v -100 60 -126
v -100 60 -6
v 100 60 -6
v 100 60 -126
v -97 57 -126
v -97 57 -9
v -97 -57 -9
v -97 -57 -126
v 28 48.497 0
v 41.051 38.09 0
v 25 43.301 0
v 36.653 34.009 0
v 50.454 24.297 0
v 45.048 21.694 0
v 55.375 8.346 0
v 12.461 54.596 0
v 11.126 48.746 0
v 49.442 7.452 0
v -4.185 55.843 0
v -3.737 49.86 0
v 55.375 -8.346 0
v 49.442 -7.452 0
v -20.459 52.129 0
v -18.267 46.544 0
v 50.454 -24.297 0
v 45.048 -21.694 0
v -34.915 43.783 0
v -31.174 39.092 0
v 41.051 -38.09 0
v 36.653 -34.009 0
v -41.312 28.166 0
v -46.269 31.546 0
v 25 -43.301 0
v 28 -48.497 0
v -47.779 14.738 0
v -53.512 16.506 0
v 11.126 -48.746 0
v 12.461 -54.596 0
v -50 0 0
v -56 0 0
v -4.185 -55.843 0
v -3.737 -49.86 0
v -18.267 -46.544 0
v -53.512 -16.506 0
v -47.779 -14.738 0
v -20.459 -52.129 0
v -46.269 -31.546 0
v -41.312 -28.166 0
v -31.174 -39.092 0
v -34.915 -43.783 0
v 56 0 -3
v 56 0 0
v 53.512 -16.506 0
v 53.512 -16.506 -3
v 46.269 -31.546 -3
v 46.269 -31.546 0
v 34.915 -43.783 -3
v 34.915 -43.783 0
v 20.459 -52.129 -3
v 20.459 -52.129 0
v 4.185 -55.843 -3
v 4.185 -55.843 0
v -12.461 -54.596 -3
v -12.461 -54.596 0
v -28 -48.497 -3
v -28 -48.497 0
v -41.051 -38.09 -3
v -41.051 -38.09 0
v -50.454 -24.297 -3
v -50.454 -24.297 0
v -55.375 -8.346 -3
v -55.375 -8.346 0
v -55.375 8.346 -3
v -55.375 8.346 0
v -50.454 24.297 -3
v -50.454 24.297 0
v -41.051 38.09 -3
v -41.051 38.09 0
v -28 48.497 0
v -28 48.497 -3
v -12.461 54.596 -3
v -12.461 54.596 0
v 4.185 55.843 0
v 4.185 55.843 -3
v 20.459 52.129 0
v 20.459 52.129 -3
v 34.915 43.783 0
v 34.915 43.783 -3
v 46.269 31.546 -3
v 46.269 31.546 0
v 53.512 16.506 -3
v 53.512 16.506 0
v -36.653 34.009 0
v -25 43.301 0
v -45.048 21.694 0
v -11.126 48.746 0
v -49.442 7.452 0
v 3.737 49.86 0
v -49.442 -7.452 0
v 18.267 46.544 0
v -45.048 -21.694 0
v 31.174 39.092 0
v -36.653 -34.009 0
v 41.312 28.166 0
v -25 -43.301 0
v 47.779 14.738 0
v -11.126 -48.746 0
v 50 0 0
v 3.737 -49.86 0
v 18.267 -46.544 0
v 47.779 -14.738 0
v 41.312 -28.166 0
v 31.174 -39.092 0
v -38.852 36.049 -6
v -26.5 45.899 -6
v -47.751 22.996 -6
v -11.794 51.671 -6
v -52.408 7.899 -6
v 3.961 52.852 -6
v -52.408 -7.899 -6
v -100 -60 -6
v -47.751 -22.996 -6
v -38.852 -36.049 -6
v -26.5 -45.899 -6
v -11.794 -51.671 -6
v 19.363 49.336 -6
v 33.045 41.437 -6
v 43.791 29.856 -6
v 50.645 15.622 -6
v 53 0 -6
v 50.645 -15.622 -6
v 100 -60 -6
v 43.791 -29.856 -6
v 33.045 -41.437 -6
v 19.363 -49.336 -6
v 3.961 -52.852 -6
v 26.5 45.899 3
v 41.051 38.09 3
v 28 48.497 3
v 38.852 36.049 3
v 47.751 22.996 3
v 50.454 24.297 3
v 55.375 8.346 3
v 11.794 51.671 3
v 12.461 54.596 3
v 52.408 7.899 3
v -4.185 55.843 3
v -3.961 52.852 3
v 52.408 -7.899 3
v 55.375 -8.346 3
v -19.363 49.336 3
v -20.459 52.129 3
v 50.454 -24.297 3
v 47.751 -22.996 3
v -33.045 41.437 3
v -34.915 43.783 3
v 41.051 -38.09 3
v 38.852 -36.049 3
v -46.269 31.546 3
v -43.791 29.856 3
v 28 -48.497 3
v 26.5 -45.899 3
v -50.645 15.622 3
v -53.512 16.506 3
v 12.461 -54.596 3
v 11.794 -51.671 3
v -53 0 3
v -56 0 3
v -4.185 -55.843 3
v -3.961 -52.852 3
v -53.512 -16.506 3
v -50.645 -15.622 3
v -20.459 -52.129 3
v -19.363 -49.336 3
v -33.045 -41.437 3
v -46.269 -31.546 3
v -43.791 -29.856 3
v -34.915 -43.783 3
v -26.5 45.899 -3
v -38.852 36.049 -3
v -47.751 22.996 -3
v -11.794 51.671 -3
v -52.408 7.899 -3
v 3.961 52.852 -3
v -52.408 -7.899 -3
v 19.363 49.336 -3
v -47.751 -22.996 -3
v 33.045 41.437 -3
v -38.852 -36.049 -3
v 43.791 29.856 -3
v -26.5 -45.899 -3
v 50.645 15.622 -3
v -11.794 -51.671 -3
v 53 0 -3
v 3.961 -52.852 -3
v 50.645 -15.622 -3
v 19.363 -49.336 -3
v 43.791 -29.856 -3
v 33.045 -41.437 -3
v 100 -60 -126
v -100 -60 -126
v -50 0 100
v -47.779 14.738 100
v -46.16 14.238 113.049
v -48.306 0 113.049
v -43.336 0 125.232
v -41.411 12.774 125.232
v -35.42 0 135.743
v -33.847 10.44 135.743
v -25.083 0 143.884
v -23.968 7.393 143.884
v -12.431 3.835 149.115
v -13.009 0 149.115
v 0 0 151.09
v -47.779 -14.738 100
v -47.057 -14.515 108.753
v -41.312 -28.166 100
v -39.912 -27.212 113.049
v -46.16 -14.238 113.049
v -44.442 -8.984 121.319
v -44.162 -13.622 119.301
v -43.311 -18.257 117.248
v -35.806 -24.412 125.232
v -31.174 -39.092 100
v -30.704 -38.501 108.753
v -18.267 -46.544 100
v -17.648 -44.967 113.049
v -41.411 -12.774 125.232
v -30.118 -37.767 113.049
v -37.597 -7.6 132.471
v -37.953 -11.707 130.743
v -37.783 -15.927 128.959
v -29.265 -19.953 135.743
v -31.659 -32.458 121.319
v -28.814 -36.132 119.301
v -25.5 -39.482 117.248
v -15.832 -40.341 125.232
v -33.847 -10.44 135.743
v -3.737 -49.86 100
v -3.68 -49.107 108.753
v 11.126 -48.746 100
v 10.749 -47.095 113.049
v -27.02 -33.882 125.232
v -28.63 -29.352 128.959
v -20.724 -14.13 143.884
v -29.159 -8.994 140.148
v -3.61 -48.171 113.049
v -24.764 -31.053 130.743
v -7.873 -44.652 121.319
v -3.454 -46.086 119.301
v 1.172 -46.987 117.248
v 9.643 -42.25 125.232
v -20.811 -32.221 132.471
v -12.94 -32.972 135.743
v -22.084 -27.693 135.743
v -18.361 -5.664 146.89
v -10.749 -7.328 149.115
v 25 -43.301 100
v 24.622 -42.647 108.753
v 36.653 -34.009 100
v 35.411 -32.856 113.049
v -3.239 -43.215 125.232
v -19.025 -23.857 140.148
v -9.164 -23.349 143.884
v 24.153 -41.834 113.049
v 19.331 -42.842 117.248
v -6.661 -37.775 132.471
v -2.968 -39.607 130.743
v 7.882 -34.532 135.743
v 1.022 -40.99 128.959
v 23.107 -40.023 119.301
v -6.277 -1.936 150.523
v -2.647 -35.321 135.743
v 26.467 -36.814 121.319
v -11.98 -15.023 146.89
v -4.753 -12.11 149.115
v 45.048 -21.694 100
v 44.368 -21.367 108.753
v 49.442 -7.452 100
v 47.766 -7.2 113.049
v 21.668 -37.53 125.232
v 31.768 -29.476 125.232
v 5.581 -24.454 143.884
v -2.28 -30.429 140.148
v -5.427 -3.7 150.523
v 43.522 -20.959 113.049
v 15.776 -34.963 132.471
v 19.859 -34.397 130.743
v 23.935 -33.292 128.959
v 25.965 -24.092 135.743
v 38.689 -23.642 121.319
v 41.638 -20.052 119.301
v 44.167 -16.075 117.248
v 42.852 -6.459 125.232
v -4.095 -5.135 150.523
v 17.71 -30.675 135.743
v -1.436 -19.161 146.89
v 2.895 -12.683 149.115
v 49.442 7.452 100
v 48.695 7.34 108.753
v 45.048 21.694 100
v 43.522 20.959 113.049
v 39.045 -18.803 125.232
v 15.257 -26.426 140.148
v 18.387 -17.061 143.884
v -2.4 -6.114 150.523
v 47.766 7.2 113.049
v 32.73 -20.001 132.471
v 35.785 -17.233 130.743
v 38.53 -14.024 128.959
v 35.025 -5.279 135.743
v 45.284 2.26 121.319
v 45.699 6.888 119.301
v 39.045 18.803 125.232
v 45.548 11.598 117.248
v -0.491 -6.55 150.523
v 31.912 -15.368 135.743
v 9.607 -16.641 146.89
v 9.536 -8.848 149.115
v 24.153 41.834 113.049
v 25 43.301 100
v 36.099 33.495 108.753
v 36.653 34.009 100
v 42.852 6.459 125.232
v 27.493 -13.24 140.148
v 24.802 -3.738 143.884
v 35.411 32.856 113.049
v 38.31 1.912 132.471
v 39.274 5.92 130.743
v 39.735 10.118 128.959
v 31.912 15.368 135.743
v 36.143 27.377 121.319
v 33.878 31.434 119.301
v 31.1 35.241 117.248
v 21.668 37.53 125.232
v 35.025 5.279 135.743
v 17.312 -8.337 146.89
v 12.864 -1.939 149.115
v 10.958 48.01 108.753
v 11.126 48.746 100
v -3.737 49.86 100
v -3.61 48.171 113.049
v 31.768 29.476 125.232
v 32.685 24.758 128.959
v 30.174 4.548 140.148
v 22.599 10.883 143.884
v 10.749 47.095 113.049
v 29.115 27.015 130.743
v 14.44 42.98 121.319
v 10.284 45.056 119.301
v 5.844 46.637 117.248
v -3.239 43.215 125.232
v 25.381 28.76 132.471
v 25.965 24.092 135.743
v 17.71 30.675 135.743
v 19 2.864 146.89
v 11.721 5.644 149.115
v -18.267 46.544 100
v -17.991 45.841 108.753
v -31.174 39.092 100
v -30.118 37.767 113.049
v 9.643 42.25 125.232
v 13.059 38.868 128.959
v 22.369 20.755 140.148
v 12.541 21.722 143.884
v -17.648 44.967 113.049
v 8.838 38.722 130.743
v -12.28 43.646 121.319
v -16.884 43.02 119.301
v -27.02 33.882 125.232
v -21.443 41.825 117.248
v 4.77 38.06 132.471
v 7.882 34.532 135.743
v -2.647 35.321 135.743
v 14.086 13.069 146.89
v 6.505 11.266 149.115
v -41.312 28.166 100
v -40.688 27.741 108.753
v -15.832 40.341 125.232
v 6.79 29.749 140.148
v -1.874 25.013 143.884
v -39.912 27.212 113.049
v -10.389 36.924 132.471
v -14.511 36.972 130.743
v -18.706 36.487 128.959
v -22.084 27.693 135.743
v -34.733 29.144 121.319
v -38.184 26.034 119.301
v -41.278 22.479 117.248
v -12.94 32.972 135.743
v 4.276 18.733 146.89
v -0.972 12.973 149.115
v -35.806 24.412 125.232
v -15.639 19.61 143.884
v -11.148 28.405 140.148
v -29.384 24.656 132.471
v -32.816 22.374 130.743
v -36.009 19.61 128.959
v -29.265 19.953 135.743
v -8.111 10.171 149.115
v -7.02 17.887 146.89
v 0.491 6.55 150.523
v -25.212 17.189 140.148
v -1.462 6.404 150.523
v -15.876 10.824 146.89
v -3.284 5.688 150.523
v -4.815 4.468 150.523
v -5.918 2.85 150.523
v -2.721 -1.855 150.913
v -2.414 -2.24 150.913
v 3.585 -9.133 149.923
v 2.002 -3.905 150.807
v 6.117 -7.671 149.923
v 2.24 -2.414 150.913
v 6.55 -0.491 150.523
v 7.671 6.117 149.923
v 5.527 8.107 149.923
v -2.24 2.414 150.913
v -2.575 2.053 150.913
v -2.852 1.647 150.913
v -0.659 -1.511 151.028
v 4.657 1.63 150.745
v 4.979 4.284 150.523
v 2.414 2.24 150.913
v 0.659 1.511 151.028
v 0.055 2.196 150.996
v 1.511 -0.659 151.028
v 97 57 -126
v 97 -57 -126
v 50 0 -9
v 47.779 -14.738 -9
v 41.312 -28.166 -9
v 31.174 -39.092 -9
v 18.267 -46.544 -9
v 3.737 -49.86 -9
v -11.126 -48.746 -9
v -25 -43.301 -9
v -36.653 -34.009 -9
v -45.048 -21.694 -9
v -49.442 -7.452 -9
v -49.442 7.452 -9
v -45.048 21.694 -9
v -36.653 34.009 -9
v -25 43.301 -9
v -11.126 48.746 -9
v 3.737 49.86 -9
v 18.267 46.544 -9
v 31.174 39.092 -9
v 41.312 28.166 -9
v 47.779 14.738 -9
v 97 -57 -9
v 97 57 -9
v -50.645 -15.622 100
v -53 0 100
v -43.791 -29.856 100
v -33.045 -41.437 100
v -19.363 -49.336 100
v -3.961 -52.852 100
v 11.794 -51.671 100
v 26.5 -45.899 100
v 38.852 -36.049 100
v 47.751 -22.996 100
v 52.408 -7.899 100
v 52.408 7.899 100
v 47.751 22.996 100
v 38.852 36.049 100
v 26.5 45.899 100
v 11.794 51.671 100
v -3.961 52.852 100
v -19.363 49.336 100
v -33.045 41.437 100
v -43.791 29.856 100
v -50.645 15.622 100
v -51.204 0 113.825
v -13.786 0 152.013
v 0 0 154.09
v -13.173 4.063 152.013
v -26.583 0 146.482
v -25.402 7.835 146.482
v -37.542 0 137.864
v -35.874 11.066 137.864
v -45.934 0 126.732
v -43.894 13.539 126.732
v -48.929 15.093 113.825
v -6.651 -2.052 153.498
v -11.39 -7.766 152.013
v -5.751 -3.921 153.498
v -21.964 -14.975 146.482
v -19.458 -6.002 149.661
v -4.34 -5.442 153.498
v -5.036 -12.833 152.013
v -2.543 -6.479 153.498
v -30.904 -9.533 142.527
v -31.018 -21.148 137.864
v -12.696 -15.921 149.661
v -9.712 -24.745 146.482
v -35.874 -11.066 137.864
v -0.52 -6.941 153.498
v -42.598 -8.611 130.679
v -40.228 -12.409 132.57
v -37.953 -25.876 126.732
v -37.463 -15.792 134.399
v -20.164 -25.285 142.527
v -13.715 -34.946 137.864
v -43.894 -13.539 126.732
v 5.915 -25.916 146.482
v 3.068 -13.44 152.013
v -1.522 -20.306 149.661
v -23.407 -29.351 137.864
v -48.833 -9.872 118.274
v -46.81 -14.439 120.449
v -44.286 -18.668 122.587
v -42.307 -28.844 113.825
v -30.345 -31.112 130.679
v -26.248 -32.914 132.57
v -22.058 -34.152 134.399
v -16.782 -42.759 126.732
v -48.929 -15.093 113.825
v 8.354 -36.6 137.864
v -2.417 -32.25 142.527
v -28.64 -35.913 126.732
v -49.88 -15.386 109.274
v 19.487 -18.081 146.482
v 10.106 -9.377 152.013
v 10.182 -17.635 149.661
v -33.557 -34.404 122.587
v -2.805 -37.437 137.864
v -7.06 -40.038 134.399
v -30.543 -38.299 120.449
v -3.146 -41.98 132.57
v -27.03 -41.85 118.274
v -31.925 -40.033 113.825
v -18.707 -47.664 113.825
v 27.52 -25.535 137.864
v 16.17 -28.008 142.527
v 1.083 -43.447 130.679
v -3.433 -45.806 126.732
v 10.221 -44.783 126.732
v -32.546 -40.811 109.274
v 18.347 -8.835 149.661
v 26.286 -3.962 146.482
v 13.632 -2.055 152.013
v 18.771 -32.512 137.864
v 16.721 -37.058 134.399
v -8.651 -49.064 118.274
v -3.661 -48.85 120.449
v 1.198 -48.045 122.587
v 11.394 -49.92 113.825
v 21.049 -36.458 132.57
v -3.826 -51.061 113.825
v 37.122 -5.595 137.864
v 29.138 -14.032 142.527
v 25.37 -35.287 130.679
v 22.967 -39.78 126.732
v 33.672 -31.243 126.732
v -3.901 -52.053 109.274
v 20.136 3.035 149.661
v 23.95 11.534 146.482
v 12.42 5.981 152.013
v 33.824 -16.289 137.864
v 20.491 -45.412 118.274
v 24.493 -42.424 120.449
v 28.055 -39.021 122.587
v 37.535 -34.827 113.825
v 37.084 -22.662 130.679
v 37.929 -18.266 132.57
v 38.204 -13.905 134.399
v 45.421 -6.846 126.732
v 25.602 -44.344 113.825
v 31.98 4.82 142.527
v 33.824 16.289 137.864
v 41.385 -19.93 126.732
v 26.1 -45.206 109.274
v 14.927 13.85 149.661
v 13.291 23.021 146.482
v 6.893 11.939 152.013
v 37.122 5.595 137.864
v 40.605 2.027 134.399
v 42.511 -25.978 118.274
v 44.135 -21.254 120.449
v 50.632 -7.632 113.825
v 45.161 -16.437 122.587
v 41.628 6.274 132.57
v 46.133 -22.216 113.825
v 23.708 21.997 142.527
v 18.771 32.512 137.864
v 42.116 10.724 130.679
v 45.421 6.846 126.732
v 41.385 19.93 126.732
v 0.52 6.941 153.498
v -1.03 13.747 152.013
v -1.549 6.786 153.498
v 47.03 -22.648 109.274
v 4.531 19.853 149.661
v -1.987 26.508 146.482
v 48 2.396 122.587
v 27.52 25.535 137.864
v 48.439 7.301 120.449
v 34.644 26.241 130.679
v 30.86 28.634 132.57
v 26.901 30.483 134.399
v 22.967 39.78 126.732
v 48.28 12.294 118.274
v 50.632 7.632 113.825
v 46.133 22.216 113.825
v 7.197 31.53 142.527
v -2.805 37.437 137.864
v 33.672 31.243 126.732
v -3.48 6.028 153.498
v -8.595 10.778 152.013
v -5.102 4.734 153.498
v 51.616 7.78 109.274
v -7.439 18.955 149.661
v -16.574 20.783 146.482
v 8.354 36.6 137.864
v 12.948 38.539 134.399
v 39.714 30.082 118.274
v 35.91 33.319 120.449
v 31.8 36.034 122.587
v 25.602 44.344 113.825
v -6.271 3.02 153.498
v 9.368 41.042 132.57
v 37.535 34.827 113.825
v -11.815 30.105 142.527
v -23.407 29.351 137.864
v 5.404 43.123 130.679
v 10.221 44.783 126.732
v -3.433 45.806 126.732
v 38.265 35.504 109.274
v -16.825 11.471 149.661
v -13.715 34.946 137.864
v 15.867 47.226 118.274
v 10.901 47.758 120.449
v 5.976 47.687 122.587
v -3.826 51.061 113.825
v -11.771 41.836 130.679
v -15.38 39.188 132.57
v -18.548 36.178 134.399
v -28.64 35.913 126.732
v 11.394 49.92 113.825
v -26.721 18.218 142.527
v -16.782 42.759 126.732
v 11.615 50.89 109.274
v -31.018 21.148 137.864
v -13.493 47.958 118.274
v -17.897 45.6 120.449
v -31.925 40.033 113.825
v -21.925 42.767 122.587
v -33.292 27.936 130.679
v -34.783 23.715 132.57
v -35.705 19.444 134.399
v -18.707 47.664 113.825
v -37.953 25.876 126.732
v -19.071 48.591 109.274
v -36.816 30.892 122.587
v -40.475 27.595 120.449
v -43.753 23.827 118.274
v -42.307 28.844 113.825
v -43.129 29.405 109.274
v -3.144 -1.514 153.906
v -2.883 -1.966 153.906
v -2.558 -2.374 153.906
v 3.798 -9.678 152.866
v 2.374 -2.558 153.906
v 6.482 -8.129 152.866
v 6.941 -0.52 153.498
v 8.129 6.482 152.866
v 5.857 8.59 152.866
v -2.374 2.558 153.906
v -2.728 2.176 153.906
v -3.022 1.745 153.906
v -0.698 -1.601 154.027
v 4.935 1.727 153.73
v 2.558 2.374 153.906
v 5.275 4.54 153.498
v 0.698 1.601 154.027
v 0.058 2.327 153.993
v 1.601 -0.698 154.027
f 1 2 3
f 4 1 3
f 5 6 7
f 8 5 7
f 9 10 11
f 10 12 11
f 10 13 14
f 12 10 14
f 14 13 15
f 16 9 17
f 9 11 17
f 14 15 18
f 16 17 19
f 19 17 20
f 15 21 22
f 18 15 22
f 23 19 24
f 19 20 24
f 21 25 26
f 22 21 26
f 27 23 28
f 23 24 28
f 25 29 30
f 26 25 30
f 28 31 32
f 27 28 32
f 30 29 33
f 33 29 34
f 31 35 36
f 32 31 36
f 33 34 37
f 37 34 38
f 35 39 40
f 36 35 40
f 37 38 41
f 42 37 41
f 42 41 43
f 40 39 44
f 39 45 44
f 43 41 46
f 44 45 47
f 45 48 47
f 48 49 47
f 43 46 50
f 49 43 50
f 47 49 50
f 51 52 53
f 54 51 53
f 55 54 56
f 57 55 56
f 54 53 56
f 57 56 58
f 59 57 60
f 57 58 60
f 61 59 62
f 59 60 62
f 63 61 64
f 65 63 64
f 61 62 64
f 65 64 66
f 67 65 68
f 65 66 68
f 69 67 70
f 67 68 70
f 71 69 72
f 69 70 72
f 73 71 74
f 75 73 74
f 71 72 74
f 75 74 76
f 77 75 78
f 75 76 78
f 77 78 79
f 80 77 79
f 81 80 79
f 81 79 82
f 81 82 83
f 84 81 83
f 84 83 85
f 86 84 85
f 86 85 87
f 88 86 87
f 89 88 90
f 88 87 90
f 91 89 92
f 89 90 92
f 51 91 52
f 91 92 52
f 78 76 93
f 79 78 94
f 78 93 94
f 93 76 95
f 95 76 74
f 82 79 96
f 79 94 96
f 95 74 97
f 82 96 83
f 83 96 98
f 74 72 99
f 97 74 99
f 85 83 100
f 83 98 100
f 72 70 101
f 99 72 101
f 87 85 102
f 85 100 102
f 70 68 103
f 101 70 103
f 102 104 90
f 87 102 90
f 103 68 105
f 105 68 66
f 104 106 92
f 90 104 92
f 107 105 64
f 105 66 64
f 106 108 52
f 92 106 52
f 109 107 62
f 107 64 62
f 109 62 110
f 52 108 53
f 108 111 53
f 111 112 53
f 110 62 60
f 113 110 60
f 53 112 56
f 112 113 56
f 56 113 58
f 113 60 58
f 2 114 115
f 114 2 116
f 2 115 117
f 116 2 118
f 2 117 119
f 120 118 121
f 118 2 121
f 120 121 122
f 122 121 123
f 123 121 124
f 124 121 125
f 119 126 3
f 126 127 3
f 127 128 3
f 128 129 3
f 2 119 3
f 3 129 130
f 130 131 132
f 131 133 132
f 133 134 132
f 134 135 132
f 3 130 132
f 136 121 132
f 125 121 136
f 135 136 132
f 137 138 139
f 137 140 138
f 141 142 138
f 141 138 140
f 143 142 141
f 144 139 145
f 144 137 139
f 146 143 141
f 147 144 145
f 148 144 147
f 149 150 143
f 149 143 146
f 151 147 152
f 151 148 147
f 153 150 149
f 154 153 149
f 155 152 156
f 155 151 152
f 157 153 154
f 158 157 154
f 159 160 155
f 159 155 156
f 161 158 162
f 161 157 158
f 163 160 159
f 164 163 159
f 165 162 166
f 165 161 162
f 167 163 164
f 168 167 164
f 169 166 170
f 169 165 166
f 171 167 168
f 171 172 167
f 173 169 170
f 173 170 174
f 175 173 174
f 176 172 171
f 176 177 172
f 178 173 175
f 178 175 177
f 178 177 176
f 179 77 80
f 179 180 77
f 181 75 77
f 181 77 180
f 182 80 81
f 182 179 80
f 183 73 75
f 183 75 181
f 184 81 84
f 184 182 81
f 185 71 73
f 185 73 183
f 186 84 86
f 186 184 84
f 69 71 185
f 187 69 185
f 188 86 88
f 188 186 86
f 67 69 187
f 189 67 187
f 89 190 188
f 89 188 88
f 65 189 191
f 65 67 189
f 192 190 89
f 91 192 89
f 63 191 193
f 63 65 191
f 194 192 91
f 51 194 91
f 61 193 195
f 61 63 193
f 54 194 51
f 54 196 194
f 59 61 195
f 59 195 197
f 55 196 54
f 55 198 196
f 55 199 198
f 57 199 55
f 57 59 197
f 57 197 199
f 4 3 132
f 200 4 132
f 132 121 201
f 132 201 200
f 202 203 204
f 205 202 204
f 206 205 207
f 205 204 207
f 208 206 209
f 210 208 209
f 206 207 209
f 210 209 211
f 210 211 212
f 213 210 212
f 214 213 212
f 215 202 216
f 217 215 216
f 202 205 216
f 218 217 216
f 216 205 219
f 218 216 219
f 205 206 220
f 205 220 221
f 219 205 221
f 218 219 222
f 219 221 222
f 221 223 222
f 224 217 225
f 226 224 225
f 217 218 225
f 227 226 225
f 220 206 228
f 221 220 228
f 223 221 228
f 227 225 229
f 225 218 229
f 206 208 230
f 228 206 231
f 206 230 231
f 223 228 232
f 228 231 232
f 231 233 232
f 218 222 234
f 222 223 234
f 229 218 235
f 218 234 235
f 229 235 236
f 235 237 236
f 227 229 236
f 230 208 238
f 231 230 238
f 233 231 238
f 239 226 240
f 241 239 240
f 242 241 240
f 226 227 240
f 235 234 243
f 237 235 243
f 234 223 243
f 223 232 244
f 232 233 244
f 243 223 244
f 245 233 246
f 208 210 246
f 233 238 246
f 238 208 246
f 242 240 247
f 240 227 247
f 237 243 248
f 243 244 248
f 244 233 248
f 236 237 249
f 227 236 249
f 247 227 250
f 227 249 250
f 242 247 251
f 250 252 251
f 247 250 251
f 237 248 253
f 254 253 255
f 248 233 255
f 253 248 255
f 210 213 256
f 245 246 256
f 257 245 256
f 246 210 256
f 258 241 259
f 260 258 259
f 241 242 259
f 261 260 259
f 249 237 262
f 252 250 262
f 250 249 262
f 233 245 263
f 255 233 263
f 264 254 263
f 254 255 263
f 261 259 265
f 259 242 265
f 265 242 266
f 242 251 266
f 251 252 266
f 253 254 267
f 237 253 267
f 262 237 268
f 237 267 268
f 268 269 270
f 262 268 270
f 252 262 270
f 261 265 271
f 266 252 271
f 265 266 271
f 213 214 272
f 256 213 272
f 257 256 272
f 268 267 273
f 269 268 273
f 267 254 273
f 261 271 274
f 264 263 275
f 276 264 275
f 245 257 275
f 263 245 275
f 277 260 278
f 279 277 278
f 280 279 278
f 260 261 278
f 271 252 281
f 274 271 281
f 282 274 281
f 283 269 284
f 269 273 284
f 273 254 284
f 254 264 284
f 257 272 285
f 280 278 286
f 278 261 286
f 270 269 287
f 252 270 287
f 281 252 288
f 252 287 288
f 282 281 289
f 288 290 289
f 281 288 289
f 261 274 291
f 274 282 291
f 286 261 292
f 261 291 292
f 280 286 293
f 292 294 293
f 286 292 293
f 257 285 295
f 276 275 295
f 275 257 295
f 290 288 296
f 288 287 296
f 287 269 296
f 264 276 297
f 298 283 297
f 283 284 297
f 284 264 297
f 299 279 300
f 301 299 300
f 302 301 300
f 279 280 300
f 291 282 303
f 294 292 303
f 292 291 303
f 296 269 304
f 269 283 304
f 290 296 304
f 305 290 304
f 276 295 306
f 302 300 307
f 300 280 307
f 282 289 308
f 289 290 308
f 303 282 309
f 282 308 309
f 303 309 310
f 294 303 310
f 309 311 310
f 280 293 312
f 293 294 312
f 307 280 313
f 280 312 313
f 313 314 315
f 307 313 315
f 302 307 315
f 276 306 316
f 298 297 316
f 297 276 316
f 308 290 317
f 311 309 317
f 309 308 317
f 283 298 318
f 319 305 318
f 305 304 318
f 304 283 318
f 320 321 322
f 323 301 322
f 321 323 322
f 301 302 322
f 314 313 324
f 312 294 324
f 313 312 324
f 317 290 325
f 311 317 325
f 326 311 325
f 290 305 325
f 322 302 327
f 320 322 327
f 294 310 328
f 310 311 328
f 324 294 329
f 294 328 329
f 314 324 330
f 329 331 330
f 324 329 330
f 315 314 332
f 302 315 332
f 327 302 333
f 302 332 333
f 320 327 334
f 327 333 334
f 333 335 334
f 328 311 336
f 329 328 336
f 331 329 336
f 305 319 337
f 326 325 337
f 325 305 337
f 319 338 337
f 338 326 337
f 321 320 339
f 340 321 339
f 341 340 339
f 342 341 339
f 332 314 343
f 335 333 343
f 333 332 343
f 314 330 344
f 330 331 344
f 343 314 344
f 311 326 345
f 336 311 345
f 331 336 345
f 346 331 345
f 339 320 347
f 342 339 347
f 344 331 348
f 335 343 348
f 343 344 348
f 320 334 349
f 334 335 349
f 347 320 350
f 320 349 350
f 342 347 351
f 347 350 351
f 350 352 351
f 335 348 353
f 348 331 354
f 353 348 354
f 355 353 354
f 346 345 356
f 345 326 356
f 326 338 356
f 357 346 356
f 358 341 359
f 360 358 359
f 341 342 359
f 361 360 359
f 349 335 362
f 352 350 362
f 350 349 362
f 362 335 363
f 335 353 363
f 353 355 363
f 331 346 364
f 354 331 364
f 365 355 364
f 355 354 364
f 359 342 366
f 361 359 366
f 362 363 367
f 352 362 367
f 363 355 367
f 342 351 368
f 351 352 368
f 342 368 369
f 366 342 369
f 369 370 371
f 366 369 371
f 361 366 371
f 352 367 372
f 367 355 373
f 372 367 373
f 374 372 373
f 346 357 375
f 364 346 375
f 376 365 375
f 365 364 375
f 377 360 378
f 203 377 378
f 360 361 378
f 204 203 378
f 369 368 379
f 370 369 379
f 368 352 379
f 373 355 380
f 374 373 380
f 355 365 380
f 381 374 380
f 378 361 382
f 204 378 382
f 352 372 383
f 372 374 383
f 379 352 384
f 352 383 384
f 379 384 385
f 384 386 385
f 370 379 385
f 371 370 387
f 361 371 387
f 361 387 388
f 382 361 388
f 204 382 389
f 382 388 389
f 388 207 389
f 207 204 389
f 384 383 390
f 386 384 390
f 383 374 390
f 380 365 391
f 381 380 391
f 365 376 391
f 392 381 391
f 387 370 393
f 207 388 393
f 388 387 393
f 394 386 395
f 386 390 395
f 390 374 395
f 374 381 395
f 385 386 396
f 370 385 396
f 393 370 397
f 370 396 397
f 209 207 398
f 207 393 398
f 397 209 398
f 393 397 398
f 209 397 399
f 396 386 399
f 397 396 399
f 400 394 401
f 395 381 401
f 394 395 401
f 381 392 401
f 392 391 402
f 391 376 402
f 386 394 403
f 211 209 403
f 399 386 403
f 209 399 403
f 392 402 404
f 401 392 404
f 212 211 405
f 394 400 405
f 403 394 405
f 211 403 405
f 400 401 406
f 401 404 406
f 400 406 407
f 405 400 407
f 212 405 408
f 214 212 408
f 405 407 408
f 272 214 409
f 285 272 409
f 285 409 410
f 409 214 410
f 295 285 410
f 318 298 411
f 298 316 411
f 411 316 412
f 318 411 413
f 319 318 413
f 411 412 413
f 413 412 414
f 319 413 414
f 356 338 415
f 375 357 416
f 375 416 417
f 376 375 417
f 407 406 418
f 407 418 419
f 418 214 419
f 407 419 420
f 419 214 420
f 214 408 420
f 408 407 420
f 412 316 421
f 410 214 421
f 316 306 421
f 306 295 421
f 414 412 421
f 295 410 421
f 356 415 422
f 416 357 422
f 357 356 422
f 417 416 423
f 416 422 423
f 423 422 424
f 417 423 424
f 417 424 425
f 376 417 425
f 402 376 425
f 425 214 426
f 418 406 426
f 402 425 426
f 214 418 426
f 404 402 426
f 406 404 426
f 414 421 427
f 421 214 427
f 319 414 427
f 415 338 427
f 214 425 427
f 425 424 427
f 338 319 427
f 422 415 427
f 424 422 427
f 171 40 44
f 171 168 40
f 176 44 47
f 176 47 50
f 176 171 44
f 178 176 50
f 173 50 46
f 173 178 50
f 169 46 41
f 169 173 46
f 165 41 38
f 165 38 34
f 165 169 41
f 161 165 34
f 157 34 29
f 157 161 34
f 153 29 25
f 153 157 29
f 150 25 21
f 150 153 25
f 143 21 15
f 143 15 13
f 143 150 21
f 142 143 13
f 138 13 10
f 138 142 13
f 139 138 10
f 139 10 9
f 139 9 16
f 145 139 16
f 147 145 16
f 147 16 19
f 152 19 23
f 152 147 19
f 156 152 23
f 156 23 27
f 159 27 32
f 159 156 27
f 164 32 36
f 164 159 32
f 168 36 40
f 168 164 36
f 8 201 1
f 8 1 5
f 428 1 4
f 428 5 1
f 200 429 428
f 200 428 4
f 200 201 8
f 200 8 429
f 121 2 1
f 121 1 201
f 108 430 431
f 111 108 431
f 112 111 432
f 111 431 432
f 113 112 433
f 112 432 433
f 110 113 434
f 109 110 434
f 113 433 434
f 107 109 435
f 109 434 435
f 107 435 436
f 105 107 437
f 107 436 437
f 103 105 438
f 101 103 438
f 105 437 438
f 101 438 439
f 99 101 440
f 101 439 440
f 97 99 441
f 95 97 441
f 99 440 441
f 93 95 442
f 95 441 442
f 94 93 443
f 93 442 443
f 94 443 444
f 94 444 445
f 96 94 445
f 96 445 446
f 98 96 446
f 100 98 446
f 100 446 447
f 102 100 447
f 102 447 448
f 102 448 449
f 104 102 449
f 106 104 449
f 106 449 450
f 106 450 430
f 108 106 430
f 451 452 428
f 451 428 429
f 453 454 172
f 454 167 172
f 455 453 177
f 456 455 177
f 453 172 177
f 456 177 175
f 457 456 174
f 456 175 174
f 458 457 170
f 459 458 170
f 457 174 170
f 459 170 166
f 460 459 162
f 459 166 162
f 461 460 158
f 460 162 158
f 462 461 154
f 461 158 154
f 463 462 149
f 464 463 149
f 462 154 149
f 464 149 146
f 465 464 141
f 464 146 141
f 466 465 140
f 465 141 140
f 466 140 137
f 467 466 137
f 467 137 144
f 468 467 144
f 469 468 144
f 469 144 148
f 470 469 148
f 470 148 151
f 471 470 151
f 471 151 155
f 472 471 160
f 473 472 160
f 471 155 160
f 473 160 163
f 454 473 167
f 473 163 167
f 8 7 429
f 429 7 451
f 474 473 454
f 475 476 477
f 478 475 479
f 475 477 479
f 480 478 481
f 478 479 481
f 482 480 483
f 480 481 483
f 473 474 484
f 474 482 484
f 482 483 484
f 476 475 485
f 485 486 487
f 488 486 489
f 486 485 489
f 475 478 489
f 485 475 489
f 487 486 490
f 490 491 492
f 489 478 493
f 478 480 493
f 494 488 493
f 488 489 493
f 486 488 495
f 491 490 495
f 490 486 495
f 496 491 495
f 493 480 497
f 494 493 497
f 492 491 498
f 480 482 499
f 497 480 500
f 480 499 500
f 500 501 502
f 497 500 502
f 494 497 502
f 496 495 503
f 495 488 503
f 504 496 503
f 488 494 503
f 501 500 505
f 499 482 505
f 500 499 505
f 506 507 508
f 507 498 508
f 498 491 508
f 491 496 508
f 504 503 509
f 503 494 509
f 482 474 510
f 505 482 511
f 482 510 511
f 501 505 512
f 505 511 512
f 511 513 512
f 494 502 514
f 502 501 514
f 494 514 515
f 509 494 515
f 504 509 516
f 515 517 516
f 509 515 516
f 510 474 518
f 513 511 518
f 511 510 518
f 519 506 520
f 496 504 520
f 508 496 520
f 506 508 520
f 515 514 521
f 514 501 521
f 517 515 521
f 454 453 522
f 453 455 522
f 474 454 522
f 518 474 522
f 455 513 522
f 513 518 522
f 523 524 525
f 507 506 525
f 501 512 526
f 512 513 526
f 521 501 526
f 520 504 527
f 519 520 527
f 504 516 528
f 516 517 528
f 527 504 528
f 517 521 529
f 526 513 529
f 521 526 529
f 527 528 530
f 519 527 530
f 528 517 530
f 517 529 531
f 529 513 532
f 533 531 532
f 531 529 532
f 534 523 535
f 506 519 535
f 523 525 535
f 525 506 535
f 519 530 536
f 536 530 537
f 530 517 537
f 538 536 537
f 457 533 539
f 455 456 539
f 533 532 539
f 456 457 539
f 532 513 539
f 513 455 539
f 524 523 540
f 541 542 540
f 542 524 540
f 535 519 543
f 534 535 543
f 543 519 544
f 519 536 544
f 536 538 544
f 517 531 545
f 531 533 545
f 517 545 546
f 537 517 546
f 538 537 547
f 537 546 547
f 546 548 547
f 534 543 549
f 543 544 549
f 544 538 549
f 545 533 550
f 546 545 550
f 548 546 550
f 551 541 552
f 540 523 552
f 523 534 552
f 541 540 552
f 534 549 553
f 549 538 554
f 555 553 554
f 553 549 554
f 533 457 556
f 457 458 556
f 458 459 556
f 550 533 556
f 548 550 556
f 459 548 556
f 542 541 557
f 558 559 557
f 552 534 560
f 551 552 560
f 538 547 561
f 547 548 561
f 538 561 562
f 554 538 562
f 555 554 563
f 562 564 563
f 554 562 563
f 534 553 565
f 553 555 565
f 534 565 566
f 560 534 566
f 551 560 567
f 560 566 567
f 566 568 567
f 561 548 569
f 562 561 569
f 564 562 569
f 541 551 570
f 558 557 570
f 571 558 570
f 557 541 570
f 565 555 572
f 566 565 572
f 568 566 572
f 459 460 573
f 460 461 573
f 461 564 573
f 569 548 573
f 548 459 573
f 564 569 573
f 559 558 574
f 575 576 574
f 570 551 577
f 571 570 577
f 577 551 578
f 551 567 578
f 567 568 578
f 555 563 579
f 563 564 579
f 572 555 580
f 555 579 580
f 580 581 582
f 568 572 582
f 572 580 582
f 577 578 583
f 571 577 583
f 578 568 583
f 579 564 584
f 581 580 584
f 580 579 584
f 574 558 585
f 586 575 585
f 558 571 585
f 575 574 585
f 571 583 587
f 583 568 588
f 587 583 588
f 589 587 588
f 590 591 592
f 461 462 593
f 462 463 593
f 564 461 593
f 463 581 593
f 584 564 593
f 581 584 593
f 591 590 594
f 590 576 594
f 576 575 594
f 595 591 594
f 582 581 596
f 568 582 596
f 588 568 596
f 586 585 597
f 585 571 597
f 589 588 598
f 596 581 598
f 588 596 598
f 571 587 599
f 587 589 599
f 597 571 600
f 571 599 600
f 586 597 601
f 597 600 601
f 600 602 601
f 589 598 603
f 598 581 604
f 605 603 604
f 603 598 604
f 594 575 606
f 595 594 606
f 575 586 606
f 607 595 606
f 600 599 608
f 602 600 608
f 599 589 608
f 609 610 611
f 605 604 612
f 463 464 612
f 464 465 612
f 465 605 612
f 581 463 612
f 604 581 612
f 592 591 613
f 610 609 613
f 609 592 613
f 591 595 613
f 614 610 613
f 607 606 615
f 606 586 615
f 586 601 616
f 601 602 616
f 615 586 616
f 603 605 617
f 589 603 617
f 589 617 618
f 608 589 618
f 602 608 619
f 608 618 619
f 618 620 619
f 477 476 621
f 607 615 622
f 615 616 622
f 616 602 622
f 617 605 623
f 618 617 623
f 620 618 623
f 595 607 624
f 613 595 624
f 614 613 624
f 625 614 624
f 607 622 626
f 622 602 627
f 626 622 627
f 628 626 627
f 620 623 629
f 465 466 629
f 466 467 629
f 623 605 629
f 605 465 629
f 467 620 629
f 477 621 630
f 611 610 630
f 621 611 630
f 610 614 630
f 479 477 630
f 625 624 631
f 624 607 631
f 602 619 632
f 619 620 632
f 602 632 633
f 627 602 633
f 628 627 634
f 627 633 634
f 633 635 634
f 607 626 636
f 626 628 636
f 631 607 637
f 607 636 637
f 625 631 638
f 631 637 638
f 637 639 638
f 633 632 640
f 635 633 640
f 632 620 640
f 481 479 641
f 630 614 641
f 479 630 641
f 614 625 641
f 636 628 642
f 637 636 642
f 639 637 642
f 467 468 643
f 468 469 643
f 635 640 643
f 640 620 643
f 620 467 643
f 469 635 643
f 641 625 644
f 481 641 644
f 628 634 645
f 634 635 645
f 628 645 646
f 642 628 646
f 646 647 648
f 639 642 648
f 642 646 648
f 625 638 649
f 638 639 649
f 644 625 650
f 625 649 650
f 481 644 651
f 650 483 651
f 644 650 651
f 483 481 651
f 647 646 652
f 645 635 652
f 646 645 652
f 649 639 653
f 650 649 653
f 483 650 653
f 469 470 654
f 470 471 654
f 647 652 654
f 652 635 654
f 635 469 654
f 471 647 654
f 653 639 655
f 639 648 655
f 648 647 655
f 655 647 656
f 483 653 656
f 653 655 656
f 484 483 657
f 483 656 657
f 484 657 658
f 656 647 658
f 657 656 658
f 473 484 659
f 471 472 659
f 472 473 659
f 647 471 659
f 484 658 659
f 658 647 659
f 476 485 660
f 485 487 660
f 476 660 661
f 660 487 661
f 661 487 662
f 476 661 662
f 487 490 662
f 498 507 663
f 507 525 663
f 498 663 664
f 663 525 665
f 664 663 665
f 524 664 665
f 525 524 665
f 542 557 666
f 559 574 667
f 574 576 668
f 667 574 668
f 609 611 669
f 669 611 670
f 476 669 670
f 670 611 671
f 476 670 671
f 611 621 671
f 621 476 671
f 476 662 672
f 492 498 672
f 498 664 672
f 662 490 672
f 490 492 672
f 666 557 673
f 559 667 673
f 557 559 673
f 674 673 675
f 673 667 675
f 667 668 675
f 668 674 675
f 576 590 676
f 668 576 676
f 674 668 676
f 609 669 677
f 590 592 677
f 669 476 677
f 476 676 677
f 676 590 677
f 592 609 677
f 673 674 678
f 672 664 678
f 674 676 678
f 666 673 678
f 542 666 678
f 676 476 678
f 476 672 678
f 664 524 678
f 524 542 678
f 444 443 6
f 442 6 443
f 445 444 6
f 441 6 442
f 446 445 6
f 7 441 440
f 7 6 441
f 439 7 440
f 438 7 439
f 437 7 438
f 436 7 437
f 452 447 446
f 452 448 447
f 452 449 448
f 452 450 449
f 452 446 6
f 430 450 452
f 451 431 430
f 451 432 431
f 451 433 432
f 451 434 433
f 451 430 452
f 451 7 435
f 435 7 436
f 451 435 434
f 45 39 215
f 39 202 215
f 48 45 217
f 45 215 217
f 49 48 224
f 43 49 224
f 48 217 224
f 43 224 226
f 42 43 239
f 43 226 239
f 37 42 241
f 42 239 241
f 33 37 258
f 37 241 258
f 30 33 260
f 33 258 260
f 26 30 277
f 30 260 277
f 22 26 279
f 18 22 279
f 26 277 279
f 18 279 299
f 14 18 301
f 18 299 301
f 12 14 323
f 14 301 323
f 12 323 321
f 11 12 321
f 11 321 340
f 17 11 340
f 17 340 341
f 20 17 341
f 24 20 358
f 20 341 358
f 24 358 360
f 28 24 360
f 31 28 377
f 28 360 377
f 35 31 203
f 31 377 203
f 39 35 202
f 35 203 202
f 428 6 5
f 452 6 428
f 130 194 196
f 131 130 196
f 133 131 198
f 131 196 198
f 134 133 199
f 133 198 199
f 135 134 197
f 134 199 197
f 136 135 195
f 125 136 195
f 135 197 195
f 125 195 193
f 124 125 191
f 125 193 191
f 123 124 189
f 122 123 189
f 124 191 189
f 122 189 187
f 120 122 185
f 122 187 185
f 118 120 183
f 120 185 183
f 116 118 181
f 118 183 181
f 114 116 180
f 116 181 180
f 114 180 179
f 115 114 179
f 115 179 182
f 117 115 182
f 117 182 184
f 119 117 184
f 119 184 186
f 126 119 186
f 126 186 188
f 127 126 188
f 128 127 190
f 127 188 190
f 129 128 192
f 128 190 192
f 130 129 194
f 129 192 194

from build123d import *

# Parameters (mm, degrees)
F0_W      = 3
F0_H      = 3
F2_R      = 56
F2_R_2    = 50
F3_DEPTH  = 3
F4_R      = 53
F4_R_2    = 50
F5_DEPTH  = 3
F6_W      = 200
F6_H      = 120
F7_DEPTH  = 120
F8_T      = 3
F9_R      = 50
F10_DEPTH = 4


# Not quite as in the source:
# - a shell that OpenCascade refuses in one call is made with other operations: the cavity is built on its own and cut out


with BuildPart() as f1:
    # F0 (on Front) → F1 (revolve)
    with BuildSketch(Plane.XZ):
        with Locations((-54.5, 1.5)):
            Rectangle(F0_W, F0_H)
        Polygon((-53, 3), (-53, 0), (-50, 0), (-50, 100), (-53, 100), align=None)
        with BuildLine():
            Line((-53, 100), (-50, 100))
            ThreePointArc((-50, 100), (-35.4201251719, 135.7429342759), (0, 151.0904042125))
            Line((0, 151.0904042125), (0, 154.0904042125))
            ThreePointArc((0, 154.0904042125), (-37.5415211912, 137.8641381384), (-53, 100))
        make_face()
    revolve(axis=Axis((0, 0, 55.2105903625), (0, 0, 1)))


with BuildPart() as f3:
    # F2 (on face) → F3 (new body)
    with BuildSketch(Plane(origin=(0, 0, 0), x_dir=(1, 0, 0), z_dir=(0, 0, -1))):
        Circle(F2_R)
        Circle(F2_R_2, mode=Mode.SUBTRACT)
    extrude(amount=F3_DEPTH)

    # F4 (on face) → F5 (join)
    with BuildSketch(Plane(origin=(0, 0, -3), x_dir=(1, 0, 0), z_dir=(0, 0, -1))):
        Circle(F4_R)
        Circle(F4_R_2, mode=Mode.SUBTRACT)
    extrude(amount=F5_DEPTH)

    # F6 (on face) → F7 (join)
    with BuildSketch(Plane(origin=(0, 0, -6), x_dir=(1, 0, 0), z_dir=(0, 0, -1))):
        Rectangle(F6_W, F6_H)
    extrude(amount=F7_DEPTH)

    # F8: shell of thickness 3, made by hand


with BuildPart() as f8_core1:
    # F8_t2: copy of F3
    add(f3.part)

    # the walls: a layer under each face that stays
    f8_faces = [f8_core1.faces().sort_by_distance(p)[0] for p in [
        (0, -60, -66),
        (100, 0, -66),
        (-100, 0, -66),
        (-66.6666666667, 40, -6),
        (0, 60, -66),
        (-53, 0, -4.5),
        (-52.2666666667, 14.9333333333, -3),
        (-56, 0, -1.5),
        (-37.3333333333, 37.3333333333, 0),
        (-50, 0, -3),
        (0, 0, -6),
    ]]
    thicken(f8_faces, amount=-F8_T, mode=Mode.SUBTRACT)

    # F8_s3 → F8_t4 (revolve, cut)
    with BuildSketch(Plane.XZ):
        Polygon((53.03, -5.97), (53, -9), (50, -9), (50, -6), align=None)
    revolve(axis=Axis((0, 0, -6), (0, 0, -1)), mode=Mode.SUBTRACT)

    # F8_s5 → F8_t6 (revolve, cut)
    with BuildSketch(Plane.XZ):
        Polygon((53.03, -3.03), (50, -3), (50, 0), (53, 0), align=None)
    revolve(axis=Axis((0, 0, -3), (0, 0, -1)), mode=Mode.SUBTRACT)

    # F8_s7 → F8_t8 (revolve, cut)
    with BuildSketch(Plane.XZ):
        Polygon((49.97, -5.97), (53, -6), (53, -9), (50, -9), align=None)
    revolve(axis=Axis((0, 0, -6), (0, 0, -1)), mode=Mode.SUBTRACT)


with BuildPart() as f3_1:
    add(f3.part)

    # what is left inside the walls is the cavity
    f8_cavity = [f8_core1.part.solids().sort_by_distance(p)[0] for p in [
        (0, -56.97, -87),
    ]]
    add(f8_cavity, mode=Mode.SUBTRACT)

    # F9 (on face) → F10 (cut)
    with BuildSketch(Plane(origin=(0, 0, -9), x_dir=(1, 0, 0), z_dir=(0, 0, -1))):
        Circle(F9_R)
    extrude(amount=-F10_DEPTH, mode=Mode.SUBTRACT)


solid = Compound([f1.part, f3_1.part])
